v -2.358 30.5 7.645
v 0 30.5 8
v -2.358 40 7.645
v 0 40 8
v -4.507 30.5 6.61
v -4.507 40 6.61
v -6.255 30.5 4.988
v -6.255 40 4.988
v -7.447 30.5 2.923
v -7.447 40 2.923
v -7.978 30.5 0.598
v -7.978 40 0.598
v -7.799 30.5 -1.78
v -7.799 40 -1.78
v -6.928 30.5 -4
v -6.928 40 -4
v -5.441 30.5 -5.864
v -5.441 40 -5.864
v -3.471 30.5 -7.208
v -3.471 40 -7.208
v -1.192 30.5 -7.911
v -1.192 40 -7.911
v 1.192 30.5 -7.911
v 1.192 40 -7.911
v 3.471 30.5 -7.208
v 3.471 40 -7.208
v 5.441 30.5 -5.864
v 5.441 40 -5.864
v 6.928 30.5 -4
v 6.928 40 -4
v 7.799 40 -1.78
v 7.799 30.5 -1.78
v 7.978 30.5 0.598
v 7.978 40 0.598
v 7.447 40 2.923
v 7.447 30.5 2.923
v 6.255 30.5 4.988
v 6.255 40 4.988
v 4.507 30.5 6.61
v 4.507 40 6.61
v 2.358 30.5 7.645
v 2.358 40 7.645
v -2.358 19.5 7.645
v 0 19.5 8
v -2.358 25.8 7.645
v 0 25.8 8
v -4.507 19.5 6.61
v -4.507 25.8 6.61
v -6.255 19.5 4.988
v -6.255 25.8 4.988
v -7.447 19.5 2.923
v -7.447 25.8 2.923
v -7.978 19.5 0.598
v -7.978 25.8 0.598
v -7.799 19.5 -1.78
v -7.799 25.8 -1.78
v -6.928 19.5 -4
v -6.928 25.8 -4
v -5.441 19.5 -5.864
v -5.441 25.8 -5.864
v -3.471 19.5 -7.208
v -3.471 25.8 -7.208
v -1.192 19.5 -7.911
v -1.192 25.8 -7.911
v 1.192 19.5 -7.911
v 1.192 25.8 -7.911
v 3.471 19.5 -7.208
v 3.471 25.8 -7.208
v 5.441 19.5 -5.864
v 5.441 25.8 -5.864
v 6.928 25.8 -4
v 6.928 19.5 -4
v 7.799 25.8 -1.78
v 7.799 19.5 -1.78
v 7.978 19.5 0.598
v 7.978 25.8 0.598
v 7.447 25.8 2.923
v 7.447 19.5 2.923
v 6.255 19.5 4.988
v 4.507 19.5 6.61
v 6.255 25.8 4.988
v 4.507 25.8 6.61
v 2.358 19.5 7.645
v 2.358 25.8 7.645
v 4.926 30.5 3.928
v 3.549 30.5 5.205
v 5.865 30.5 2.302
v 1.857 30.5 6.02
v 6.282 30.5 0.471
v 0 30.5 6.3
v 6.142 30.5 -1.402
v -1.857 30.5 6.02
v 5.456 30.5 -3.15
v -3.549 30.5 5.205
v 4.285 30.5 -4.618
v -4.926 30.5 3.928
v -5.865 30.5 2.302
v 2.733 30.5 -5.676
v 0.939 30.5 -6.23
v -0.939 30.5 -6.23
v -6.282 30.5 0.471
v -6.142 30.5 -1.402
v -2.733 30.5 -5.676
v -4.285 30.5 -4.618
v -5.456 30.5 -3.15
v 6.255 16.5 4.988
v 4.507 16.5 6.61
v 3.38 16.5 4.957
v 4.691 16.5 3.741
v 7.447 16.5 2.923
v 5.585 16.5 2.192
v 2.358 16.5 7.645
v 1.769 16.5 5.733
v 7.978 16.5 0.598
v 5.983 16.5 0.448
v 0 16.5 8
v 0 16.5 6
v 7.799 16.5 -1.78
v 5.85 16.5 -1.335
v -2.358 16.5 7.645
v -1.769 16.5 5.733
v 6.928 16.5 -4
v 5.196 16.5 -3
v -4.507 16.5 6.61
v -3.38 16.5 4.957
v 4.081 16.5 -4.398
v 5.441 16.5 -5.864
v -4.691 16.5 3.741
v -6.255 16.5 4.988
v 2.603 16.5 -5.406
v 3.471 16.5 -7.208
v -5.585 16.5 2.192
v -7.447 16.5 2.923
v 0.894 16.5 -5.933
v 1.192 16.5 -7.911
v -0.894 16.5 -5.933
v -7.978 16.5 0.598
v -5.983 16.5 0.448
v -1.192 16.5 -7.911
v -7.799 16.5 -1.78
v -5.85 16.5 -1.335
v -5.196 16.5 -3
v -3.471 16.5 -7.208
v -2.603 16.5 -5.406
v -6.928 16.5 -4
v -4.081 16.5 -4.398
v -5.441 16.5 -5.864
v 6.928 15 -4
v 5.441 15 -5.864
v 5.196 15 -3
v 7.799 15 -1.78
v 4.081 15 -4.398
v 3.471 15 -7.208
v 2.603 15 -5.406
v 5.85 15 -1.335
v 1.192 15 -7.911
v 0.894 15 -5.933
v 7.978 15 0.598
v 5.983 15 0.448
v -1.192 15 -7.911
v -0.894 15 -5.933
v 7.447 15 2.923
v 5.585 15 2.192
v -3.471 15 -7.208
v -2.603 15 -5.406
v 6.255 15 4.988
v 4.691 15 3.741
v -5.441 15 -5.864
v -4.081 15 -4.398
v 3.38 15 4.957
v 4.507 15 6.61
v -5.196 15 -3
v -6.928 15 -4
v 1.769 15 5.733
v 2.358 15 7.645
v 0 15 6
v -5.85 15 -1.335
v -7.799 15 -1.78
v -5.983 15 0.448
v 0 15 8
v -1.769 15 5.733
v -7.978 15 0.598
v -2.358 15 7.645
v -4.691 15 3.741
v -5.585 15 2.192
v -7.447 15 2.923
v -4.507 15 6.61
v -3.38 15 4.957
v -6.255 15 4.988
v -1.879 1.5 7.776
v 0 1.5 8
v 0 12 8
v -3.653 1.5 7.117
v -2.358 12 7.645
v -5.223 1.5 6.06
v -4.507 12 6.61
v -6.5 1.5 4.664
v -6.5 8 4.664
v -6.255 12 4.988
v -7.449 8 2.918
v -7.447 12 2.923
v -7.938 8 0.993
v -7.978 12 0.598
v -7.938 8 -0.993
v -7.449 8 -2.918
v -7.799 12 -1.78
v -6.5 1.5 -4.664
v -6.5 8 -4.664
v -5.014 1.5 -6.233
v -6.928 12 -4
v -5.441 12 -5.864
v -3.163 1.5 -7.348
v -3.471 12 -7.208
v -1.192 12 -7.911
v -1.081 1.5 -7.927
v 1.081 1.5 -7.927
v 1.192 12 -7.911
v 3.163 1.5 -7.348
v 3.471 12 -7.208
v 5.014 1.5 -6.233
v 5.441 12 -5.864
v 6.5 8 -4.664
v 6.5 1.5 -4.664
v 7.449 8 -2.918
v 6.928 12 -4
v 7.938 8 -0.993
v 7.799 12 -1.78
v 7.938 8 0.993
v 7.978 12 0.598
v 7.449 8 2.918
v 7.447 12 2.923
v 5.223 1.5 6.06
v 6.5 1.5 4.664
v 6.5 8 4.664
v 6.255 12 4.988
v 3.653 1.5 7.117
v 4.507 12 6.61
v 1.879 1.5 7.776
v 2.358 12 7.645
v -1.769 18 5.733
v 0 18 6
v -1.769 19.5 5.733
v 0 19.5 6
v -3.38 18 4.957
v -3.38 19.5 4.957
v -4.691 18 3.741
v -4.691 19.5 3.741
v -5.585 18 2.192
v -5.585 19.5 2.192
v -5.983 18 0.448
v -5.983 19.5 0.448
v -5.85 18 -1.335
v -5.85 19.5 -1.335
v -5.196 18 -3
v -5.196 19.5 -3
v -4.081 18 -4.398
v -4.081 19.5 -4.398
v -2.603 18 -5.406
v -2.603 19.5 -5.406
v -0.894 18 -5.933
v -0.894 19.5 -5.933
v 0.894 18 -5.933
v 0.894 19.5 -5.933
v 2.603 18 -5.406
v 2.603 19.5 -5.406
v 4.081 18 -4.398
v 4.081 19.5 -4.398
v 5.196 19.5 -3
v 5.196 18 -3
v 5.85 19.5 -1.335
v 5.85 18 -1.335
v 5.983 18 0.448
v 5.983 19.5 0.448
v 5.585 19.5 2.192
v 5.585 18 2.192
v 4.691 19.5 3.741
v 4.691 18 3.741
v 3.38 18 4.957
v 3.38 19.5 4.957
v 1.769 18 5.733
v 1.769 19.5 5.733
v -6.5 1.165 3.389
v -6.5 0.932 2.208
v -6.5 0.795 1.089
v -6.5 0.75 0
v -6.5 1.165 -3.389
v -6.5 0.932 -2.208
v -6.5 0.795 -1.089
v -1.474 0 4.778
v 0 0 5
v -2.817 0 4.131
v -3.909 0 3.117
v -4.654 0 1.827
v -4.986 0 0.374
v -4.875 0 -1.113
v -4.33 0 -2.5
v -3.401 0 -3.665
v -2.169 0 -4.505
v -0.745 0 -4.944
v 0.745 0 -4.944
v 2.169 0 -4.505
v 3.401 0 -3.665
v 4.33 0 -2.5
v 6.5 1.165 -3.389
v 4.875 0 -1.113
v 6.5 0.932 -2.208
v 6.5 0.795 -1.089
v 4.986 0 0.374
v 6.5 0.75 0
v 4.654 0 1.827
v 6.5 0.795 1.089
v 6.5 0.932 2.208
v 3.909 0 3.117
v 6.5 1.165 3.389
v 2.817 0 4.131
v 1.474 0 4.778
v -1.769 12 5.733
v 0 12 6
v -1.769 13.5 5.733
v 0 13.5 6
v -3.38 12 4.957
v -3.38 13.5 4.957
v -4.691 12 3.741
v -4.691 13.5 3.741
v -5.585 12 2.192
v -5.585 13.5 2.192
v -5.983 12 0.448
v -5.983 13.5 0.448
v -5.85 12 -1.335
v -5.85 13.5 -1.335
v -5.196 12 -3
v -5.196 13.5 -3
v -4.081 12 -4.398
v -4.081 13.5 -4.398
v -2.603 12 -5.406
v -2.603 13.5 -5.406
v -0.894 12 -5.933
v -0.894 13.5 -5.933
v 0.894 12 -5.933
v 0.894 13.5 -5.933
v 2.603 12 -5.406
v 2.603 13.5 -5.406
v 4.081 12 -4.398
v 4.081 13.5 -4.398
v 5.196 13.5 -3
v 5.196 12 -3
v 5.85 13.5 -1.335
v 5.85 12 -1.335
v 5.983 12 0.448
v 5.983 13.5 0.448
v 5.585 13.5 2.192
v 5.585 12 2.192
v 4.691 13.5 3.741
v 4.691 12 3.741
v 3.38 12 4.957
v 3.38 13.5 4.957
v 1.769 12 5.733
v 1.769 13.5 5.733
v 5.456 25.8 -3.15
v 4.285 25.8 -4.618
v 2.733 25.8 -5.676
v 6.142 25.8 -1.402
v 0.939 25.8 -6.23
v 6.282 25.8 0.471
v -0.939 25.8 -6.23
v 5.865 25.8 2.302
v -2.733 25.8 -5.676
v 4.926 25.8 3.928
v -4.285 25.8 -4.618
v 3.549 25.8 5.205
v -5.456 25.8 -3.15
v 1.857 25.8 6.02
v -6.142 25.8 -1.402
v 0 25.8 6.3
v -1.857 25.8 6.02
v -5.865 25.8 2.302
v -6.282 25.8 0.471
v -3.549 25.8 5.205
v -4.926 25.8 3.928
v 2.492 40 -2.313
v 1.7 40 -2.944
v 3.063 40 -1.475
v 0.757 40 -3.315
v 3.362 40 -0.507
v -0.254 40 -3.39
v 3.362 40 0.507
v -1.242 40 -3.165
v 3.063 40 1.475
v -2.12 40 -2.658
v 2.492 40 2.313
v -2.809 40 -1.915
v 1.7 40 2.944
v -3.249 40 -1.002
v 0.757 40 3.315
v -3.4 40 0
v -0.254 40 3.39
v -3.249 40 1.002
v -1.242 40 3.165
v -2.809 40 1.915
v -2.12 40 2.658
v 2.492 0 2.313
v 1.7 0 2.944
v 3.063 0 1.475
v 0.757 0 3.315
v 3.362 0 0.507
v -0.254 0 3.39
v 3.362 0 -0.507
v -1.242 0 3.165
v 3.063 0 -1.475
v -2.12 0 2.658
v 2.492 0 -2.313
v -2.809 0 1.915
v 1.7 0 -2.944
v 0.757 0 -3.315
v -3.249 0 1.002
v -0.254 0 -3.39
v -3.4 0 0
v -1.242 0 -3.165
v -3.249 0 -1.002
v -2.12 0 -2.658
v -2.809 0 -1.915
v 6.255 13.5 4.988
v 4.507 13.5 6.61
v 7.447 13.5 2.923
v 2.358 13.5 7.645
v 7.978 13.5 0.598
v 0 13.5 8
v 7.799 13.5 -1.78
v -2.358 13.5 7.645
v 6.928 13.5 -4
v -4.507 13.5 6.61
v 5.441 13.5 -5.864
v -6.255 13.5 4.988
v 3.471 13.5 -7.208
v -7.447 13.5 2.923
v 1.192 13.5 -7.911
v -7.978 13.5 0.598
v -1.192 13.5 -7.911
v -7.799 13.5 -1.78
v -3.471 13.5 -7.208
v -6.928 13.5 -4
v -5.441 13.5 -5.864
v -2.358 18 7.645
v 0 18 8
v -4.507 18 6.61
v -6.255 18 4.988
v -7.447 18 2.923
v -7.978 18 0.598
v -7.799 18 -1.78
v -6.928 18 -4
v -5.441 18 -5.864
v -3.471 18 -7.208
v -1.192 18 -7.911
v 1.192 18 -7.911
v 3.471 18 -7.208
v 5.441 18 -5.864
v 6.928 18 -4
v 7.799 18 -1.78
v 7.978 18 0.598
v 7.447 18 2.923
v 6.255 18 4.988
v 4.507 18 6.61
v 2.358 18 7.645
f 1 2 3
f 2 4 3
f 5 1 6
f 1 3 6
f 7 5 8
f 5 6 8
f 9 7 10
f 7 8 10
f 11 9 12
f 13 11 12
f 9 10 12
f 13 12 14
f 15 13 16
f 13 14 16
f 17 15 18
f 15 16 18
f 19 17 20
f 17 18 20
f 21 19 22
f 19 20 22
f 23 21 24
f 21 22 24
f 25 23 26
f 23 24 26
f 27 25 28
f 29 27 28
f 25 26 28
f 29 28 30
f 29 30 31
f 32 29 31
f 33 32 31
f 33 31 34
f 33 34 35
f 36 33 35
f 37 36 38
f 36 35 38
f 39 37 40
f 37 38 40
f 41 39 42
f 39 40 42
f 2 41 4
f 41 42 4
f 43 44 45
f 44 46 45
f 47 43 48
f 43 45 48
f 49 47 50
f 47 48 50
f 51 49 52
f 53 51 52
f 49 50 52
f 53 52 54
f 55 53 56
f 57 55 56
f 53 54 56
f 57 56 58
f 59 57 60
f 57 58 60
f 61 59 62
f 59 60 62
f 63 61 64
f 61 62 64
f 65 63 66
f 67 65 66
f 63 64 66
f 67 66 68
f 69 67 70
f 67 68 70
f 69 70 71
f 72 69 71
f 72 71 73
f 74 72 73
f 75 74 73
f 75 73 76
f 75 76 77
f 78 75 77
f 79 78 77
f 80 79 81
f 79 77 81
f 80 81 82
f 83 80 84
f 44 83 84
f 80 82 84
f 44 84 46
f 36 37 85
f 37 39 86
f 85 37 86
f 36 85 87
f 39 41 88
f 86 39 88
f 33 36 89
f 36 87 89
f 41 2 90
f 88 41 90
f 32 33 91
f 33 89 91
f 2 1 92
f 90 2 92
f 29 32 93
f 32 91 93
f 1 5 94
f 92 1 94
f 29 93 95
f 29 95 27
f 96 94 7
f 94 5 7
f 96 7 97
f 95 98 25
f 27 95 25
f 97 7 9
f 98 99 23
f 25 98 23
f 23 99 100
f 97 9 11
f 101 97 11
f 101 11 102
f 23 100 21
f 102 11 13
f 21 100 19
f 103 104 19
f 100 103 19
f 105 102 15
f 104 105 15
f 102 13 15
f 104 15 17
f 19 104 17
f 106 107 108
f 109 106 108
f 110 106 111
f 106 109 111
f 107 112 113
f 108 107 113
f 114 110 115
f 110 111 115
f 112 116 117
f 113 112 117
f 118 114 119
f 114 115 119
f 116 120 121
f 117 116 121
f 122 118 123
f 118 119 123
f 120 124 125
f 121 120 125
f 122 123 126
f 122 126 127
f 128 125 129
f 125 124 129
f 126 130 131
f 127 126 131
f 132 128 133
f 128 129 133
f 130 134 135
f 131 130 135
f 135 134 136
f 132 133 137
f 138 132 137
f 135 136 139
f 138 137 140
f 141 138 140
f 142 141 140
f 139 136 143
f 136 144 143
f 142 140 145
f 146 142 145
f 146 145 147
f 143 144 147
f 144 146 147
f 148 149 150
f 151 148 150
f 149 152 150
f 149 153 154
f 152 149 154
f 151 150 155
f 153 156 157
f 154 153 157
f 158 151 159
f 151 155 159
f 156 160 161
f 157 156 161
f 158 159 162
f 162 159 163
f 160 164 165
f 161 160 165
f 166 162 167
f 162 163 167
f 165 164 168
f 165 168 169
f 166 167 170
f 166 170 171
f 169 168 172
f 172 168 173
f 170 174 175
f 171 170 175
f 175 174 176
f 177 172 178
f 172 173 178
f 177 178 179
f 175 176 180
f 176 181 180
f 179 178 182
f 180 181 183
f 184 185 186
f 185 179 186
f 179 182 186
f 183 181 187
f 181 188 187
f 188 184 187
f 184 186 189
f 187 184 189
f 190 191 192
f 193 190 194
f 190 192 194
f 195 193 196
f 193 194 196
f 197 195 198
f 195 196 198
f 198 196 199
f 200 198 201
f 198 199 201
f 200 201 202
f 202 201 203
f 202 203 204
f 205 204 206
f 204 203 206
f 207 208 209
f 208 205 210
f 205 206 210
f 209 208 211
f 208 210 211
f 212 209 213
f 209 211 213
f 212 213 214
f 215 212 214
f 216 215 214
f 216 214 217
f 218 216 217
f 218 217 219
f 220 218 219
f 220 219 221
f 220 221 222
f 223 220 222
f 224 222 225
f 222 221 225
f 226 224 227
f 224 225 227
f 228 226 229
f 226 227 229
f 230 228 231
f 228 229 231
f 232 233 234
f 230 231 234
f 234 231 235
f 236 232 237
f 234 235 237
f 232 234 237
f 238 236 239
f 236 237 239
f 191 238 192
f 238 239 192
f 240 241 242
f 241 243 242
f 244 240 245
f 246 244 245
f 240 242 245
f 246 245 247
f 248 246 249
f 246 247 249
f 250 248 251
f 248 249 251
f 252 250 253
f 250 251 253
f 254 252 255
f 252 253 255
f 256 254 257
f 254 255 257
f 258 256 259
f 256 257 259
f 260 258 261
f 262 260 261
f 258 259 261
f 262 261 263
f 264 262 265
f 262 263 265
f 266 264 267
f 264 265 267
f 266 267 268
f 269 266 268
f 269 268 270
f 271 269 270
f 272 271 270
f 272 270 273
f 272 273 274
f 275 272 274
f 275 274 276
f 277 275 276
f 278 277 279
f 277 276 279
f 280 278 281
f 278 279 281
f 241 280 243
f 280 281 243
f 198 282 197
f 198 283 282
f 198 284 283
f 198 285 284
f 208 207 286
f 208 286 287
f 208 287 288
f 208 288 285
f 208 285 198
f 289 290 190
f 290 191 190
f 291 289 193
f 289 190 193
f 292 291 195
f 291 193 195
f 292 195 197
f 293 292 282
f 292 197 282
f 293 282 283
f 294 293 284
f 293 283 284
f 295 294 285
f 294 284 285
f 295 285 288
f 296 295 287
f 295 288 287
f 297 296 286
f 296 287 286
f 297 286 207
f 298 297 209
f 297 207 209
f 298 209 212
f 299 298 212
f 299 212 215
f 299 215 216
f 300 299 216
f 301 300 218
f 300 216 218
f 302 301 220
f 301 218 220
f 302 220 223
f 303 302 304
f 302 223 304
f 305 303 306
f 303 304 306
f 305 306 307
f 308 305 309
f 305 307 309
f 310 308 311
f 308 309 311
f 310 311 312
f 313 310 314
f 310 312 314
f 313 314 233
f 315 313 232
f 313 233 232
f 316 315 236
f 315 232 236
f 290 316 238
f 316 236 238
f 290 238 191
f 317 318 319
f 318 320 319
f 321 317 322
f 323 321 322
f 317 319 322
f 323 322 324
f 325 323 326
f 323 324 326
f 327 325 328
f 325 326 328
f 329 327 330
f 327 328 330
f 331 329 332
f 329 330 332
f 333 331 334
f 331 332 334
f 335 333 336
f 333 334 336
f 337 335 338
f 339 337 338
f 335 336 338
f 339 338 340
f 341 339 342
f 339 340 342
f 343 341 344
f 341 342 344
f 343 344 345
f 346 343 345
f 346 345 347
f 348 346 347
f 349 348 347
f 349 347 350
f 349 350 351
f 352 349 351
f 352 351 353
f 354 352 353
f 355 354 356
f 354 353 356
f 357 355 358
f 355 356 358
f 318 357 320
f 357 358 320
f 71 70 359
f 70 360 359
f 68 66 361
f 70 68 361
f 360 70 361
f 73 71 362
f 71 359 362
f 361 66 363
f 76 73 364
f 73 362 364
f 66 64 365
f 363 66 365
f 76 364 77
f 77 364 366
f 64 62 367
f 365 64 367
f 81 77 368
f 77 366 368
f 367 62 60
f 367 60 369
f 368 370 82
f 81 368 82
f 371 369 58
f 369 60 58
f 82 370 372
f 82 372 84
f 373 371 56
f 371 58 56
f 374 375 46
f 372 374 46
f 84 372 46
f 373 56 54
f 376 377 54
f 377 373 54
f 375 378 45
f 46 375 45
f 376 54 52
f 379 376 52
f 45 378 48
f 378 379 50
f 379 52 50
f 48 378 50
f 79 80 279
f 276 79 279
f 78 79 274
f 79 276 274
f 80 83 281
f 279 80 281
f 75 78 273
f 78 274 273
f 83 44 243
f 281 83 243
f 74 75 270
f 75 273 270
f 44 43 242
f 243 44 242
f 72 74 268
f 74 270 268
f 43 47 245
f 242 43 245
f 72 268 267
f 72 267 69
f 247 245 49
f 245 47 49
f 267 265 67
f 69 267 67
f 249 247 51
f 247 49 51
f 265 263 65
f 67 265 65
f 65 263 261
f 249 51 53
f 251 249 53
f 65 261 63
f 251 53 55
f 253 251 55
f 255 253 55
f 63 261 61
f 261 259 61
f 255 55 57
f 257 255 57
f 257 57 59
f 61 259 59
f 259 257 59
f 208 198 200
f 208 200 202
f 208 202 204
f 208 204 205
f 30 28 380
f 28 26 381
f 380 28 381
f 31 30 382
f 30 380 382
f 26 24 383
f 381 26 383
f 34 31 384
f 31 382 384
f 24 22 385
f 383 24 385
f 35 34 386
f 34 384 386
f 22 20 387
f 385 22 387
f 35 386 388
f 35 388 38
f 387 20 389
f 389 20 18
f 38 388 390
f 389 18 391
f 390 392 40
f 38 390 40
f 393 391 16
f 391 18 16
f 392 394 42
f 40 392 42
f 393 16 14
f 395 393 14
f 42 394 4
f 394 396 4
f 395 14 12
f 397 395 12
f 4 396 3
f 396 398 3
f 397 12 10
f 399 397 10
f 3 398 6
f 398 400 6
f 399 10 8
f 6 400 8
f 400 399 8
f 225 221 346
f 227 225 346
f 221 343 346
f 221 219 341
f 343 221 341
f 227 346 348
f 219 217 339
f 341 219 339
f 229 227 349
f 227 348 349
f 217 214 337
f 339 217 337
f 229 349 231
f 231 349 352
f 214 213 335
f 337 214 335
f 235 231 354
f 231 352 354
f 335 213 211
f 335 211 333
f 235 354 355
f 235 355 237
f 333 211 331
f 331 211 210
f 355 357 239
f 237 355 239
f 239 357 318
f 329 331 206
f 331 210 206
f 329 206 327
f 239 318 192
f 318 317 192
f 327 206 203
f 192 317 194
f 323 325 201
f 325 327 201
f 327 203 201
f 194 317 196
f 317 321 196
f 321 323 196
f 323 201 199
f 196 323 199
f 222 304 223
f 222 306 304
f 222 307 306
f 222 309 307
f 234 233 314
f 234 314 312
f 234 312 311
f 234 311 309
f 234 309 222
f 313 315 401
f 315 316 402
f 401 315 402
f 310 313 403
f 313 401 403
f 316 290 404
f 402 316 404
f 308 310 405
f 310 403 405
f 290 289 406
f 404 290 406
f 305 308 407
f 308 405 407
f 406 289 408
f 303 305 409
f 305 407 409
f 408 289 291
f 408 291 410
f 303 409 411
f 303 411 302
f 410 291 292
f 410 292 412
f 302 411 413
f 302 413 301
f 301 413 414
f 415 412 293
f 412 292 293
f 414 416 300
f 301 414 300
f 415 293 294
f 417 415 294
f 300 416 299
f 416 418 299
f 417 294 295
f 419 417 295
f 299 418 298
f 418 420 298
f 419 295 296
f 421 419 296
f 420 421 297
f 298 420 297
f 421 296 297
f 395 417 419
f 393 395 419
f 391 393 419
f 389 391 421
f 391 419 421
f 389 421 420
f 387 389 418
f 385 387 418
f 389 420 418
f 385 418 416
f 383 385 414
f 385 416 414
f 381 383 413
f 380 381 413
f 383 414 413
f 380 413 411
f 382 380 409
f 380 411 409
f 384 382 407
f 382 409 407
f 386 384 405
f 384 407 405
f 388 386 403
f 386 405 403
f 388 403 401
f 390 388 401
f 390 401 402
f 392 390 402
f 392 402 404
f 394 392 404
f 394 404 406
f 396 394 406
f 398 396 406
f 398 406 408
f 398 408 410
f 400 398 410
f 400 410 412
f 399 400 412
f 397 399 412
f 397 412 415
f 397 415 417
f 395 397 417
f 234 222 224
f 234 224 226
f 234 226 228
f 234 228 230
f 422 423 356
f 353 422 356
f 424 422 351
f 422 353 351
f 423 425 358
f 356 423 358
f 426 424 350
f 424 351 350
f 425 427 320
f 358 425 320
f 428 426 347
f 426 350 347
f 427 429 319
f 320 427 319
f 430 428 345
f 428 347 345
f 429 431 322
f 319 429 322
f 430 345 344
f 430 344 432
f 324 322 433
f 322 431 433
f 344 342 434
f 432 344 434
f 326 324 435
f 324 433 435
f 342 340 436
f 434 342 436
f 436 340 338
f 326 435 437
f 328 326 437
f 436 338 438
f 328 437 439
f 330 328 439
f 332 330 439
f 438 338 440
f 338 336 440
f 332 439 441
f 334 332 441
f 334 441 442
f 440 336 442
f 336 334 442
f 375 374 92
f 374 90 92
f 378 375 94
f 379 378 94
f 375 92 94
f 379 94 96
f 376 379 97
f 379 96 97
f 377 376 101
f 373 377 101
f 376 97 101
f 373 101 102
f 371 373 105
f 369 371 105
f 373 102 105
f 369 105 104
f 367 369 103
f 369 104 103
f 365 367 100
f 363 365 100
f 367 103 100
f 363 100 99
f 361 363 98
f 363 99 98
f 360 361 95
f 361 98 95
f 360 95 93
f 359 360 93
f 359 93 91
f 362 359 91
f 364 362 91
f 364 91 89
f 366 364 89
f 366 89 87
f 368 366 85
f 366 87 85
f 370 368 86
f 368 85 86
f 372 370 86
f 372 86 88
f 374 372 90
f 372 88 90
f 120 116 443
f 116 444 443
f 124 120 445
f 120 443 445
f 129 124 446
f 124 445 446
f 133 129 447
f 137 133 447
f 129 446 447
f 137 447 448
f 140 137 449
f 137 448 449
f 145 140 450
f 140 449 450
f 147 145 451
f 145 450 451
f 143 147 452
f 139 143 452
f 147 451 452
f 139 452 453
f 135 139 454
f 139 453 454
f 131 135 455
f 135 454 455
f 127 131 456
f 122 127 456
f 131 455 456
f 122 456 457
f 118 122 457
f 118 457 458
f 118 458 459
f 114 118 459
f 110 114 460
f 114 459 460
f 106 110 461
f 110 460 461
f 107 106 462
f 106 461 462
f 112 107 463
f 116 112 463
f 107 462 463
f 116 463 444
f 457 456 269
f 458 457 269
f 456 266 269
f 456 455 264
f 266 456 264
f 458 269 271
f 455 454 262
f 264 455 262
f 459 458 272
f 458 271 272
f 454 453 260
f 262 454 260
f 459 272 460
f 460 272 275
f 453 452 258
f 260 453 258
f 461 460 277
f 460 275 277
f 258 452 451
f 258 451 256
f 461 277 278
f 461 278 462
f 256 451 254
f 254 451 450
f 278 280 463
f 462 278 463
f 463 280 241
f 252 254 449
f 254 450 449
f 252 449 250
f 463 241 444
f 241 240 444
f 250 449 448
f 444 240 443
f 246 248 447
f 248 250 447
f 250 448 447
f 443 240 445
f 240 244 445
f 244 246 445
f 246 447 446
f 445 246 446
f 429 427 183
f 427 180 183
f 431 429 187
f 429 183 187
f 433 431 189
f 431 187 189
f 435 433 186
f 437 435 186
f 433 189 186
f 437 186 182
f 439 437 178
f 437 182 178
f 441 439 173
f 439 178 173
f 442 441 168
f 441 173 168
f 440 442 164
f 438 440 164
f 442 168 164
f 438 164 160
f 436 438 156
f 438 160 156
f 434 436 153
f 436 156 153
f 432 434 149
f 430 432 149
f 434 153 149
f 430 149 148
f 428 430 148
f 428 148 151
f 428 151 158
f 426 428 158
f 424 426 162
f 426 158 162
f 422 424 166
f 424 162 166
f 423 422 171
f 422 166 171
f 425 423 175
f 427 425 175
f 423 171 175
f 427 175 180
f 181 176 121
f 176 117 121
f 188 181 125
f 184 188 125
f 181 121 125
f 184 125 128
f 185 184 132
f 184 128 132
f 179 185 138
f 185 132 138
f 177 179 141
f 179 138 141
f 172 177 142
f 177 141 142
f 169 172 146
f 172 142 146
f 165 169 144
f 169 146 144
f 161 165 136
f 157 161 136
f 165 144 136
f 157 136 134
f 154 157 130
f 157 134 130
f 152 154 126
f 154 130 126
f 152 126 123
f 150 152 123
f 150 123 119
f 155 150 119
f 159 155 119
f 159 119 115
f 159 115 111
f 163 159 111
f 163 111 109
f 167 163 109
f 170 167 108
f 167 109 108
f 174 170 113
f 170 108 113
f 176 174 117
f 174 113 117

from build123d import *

# Parameters (mm, degrees)
TAGLIO_ESTRUSIONE1_REACH                  = 43.569
TAGLIO_ESTRUSIONE1_END_RADIUS             = 8
SCHIZZO2_W                                = 1.5
SCHIZZO2_H                                = 8
TAGLIO_ESTRUSIONE1_DIRECTION_2_REACH      = 43.569
TAGLIO_ESTRUSIONE1_DIRECTION_2_END_RADIUS = 8
FORO_FILETTATO_M8_1_D                     = 6.8


with BuildPart() as part:
    # Schizzo1 → Rivoluzione1 (revolve)
    with BuildSketch(Plane.XY, mode=Mode.PRIVATE) as rivoluzione1_sk:
        Polygon((0, 0), (-5, 0), (-8, 1.5), (-8, 12), (-6, 12), (-6, 13.5), (-8, 13.5), (-8, 15), (-6, 15), (-6, 16.5), (-8, 16.5), (-8, 18), (-6, 18), (-6, 19.5), (-8, 19.5), (-8, 25.8), (-6.3, 25.8), (-6.3, 30.5), (-8, 30.5), (-8, 40), (0, 40), align=None)
    revolve(rivoluzione1_sk.sketch.rotate(Axis((0, 129.407380346, 0), (0, -1, 0)), 270), axis=Axis((0, 129.407380346, 0), (0, -1, 0)))

    # Taglio-Estrusione1: up to this cylinder (the profile starts inside it)
    taglio_estrusione1_end = Plane(origin=(0, 4, 0), z_dir=(0, 1, 0)) * Cylinder(TAGLIO_ESTRUSIONE1_END_RADIUS, 104.138, mode=Mode.PRIVATE)
    # Schizzo2 → Taglio-Estrusione1 (cut, up to the surface)
    with BuildSketch(Plane.XY, mode=Mode.PRIVATE) as taglio_estrusione1_sk1:
        with Locations((-7.25, 4)):
            Rectangle(SCHIZZO2_W, SCHIZZO2_H)
    taglio_estrusione1_tool1 = extrude(taglio_estrusione1_sk1.sketch, amount=-TAGLIO_ESTRUSIONE1_REACH, mode=Mode.PRIVATE) & taglio_estrusione1_end
    add(taglio_estrusione1_tool1.solids().sort_by_distance((-7.25, 4, 0))[0], mode=Mode.SUBTRACT)
    # Schizzo2 → Taglio-Estrusione1 (cut, up to the surface)
    with BuildSketch(Plane.XY, mode=Mode.PRIVATE) as taglio_estrusione1_sk2:
        with Locations((7.25, 4)):
            Rectangle(SCHIZZO2_W, SCHIZZO2_H)
    taglio_estrusione1_tool2 = extrude(taglio_estrusione1_sk2.sketch, amount=-TAGLIO_ESTRUSIONE1_REACH, mode=Mode.PRIVATE) & taglio_estrusione1_end
    add(taglio_estrusione1_tool2.solids().sort_by_distance((7.25, 4, 0))[0], mode=Mode.SUBTRACT)

    # Taglio-Estrusione1 direction 2: up to this cylinder (the profile starts inside it)
    taglio_estrusione1_direction_2_end = Plane(origin=(0, 4, 0), z_dir=(0, 1, 0)) * Cylinder(TAGLIO_ESTRUSIONE1_DIRECTION_2_END_RADIUS, 104.138, mode=Mode.PRIVATE)
    # Schizzo2 → Taglio-Estrusione1 direction 2 (cut, up to the surface)
    with BuildSketch(Plane.XY, mode=Mode.PRIVATE) as taglio_estrusione1_direction_2_sk1:
        with Locations((-7.25, 4)):
            Rectangle(SCHIZZO2_W, SCHIZZO2_H)
    taglio_estrusione1_direction_2_tool1 = extrude(taglio_estrusione1_direction_2_sk1.sketch, amount=TAGLIO_ESTRUSIONE1_DIRECTION_2_REACH, mode=Mode.PRIVATE) & taglio_estrusione1_direction_2_end
    add(taglio_estrusione1_direction_2_tool1.solids().sort_by_distance((-7.25, 4, 0))[0], mode=Mode.SUBTRACT)
    # Schizzo2 → Taglio-Estrusione1 direction 2 (cut, up to the surface)
    with BuildSketch(Plane.XY, mode=Mode.PRIVATE) as taglio_estrusione1_direction_2_sk2:
        with Locations((7.25, 4)):
            Rectangle(SCHIZZO2_W, SCHIZZO2_H)
    taglio_estrusione1_direction_2_tool2 = extrude(taglio_estrusione1_direction_2_sk2.sketch, amount=TAGLIO_ESTRUSIONE1_DIRECTION_2_REACH, mode=Mode.PRIVATE) & taglio_estrusione1_direction_2_end
    add(taglio_estrusione1_direction_2_tool2.solids().sort_by_distance((7.25, 4, 0))[0], mode=Mode.SUBTRACT)

    # Foro filettato M8-1 (through all)
    with Locations(Plane(origin=(0, 40, 0), x_dir=(1, 0, 0), z_dir=(0, 1, 0))):
        with Locations((0, 0)):
            Hole(FORO_FILETTATO_M8_1_D / 2)


solid = part.part
